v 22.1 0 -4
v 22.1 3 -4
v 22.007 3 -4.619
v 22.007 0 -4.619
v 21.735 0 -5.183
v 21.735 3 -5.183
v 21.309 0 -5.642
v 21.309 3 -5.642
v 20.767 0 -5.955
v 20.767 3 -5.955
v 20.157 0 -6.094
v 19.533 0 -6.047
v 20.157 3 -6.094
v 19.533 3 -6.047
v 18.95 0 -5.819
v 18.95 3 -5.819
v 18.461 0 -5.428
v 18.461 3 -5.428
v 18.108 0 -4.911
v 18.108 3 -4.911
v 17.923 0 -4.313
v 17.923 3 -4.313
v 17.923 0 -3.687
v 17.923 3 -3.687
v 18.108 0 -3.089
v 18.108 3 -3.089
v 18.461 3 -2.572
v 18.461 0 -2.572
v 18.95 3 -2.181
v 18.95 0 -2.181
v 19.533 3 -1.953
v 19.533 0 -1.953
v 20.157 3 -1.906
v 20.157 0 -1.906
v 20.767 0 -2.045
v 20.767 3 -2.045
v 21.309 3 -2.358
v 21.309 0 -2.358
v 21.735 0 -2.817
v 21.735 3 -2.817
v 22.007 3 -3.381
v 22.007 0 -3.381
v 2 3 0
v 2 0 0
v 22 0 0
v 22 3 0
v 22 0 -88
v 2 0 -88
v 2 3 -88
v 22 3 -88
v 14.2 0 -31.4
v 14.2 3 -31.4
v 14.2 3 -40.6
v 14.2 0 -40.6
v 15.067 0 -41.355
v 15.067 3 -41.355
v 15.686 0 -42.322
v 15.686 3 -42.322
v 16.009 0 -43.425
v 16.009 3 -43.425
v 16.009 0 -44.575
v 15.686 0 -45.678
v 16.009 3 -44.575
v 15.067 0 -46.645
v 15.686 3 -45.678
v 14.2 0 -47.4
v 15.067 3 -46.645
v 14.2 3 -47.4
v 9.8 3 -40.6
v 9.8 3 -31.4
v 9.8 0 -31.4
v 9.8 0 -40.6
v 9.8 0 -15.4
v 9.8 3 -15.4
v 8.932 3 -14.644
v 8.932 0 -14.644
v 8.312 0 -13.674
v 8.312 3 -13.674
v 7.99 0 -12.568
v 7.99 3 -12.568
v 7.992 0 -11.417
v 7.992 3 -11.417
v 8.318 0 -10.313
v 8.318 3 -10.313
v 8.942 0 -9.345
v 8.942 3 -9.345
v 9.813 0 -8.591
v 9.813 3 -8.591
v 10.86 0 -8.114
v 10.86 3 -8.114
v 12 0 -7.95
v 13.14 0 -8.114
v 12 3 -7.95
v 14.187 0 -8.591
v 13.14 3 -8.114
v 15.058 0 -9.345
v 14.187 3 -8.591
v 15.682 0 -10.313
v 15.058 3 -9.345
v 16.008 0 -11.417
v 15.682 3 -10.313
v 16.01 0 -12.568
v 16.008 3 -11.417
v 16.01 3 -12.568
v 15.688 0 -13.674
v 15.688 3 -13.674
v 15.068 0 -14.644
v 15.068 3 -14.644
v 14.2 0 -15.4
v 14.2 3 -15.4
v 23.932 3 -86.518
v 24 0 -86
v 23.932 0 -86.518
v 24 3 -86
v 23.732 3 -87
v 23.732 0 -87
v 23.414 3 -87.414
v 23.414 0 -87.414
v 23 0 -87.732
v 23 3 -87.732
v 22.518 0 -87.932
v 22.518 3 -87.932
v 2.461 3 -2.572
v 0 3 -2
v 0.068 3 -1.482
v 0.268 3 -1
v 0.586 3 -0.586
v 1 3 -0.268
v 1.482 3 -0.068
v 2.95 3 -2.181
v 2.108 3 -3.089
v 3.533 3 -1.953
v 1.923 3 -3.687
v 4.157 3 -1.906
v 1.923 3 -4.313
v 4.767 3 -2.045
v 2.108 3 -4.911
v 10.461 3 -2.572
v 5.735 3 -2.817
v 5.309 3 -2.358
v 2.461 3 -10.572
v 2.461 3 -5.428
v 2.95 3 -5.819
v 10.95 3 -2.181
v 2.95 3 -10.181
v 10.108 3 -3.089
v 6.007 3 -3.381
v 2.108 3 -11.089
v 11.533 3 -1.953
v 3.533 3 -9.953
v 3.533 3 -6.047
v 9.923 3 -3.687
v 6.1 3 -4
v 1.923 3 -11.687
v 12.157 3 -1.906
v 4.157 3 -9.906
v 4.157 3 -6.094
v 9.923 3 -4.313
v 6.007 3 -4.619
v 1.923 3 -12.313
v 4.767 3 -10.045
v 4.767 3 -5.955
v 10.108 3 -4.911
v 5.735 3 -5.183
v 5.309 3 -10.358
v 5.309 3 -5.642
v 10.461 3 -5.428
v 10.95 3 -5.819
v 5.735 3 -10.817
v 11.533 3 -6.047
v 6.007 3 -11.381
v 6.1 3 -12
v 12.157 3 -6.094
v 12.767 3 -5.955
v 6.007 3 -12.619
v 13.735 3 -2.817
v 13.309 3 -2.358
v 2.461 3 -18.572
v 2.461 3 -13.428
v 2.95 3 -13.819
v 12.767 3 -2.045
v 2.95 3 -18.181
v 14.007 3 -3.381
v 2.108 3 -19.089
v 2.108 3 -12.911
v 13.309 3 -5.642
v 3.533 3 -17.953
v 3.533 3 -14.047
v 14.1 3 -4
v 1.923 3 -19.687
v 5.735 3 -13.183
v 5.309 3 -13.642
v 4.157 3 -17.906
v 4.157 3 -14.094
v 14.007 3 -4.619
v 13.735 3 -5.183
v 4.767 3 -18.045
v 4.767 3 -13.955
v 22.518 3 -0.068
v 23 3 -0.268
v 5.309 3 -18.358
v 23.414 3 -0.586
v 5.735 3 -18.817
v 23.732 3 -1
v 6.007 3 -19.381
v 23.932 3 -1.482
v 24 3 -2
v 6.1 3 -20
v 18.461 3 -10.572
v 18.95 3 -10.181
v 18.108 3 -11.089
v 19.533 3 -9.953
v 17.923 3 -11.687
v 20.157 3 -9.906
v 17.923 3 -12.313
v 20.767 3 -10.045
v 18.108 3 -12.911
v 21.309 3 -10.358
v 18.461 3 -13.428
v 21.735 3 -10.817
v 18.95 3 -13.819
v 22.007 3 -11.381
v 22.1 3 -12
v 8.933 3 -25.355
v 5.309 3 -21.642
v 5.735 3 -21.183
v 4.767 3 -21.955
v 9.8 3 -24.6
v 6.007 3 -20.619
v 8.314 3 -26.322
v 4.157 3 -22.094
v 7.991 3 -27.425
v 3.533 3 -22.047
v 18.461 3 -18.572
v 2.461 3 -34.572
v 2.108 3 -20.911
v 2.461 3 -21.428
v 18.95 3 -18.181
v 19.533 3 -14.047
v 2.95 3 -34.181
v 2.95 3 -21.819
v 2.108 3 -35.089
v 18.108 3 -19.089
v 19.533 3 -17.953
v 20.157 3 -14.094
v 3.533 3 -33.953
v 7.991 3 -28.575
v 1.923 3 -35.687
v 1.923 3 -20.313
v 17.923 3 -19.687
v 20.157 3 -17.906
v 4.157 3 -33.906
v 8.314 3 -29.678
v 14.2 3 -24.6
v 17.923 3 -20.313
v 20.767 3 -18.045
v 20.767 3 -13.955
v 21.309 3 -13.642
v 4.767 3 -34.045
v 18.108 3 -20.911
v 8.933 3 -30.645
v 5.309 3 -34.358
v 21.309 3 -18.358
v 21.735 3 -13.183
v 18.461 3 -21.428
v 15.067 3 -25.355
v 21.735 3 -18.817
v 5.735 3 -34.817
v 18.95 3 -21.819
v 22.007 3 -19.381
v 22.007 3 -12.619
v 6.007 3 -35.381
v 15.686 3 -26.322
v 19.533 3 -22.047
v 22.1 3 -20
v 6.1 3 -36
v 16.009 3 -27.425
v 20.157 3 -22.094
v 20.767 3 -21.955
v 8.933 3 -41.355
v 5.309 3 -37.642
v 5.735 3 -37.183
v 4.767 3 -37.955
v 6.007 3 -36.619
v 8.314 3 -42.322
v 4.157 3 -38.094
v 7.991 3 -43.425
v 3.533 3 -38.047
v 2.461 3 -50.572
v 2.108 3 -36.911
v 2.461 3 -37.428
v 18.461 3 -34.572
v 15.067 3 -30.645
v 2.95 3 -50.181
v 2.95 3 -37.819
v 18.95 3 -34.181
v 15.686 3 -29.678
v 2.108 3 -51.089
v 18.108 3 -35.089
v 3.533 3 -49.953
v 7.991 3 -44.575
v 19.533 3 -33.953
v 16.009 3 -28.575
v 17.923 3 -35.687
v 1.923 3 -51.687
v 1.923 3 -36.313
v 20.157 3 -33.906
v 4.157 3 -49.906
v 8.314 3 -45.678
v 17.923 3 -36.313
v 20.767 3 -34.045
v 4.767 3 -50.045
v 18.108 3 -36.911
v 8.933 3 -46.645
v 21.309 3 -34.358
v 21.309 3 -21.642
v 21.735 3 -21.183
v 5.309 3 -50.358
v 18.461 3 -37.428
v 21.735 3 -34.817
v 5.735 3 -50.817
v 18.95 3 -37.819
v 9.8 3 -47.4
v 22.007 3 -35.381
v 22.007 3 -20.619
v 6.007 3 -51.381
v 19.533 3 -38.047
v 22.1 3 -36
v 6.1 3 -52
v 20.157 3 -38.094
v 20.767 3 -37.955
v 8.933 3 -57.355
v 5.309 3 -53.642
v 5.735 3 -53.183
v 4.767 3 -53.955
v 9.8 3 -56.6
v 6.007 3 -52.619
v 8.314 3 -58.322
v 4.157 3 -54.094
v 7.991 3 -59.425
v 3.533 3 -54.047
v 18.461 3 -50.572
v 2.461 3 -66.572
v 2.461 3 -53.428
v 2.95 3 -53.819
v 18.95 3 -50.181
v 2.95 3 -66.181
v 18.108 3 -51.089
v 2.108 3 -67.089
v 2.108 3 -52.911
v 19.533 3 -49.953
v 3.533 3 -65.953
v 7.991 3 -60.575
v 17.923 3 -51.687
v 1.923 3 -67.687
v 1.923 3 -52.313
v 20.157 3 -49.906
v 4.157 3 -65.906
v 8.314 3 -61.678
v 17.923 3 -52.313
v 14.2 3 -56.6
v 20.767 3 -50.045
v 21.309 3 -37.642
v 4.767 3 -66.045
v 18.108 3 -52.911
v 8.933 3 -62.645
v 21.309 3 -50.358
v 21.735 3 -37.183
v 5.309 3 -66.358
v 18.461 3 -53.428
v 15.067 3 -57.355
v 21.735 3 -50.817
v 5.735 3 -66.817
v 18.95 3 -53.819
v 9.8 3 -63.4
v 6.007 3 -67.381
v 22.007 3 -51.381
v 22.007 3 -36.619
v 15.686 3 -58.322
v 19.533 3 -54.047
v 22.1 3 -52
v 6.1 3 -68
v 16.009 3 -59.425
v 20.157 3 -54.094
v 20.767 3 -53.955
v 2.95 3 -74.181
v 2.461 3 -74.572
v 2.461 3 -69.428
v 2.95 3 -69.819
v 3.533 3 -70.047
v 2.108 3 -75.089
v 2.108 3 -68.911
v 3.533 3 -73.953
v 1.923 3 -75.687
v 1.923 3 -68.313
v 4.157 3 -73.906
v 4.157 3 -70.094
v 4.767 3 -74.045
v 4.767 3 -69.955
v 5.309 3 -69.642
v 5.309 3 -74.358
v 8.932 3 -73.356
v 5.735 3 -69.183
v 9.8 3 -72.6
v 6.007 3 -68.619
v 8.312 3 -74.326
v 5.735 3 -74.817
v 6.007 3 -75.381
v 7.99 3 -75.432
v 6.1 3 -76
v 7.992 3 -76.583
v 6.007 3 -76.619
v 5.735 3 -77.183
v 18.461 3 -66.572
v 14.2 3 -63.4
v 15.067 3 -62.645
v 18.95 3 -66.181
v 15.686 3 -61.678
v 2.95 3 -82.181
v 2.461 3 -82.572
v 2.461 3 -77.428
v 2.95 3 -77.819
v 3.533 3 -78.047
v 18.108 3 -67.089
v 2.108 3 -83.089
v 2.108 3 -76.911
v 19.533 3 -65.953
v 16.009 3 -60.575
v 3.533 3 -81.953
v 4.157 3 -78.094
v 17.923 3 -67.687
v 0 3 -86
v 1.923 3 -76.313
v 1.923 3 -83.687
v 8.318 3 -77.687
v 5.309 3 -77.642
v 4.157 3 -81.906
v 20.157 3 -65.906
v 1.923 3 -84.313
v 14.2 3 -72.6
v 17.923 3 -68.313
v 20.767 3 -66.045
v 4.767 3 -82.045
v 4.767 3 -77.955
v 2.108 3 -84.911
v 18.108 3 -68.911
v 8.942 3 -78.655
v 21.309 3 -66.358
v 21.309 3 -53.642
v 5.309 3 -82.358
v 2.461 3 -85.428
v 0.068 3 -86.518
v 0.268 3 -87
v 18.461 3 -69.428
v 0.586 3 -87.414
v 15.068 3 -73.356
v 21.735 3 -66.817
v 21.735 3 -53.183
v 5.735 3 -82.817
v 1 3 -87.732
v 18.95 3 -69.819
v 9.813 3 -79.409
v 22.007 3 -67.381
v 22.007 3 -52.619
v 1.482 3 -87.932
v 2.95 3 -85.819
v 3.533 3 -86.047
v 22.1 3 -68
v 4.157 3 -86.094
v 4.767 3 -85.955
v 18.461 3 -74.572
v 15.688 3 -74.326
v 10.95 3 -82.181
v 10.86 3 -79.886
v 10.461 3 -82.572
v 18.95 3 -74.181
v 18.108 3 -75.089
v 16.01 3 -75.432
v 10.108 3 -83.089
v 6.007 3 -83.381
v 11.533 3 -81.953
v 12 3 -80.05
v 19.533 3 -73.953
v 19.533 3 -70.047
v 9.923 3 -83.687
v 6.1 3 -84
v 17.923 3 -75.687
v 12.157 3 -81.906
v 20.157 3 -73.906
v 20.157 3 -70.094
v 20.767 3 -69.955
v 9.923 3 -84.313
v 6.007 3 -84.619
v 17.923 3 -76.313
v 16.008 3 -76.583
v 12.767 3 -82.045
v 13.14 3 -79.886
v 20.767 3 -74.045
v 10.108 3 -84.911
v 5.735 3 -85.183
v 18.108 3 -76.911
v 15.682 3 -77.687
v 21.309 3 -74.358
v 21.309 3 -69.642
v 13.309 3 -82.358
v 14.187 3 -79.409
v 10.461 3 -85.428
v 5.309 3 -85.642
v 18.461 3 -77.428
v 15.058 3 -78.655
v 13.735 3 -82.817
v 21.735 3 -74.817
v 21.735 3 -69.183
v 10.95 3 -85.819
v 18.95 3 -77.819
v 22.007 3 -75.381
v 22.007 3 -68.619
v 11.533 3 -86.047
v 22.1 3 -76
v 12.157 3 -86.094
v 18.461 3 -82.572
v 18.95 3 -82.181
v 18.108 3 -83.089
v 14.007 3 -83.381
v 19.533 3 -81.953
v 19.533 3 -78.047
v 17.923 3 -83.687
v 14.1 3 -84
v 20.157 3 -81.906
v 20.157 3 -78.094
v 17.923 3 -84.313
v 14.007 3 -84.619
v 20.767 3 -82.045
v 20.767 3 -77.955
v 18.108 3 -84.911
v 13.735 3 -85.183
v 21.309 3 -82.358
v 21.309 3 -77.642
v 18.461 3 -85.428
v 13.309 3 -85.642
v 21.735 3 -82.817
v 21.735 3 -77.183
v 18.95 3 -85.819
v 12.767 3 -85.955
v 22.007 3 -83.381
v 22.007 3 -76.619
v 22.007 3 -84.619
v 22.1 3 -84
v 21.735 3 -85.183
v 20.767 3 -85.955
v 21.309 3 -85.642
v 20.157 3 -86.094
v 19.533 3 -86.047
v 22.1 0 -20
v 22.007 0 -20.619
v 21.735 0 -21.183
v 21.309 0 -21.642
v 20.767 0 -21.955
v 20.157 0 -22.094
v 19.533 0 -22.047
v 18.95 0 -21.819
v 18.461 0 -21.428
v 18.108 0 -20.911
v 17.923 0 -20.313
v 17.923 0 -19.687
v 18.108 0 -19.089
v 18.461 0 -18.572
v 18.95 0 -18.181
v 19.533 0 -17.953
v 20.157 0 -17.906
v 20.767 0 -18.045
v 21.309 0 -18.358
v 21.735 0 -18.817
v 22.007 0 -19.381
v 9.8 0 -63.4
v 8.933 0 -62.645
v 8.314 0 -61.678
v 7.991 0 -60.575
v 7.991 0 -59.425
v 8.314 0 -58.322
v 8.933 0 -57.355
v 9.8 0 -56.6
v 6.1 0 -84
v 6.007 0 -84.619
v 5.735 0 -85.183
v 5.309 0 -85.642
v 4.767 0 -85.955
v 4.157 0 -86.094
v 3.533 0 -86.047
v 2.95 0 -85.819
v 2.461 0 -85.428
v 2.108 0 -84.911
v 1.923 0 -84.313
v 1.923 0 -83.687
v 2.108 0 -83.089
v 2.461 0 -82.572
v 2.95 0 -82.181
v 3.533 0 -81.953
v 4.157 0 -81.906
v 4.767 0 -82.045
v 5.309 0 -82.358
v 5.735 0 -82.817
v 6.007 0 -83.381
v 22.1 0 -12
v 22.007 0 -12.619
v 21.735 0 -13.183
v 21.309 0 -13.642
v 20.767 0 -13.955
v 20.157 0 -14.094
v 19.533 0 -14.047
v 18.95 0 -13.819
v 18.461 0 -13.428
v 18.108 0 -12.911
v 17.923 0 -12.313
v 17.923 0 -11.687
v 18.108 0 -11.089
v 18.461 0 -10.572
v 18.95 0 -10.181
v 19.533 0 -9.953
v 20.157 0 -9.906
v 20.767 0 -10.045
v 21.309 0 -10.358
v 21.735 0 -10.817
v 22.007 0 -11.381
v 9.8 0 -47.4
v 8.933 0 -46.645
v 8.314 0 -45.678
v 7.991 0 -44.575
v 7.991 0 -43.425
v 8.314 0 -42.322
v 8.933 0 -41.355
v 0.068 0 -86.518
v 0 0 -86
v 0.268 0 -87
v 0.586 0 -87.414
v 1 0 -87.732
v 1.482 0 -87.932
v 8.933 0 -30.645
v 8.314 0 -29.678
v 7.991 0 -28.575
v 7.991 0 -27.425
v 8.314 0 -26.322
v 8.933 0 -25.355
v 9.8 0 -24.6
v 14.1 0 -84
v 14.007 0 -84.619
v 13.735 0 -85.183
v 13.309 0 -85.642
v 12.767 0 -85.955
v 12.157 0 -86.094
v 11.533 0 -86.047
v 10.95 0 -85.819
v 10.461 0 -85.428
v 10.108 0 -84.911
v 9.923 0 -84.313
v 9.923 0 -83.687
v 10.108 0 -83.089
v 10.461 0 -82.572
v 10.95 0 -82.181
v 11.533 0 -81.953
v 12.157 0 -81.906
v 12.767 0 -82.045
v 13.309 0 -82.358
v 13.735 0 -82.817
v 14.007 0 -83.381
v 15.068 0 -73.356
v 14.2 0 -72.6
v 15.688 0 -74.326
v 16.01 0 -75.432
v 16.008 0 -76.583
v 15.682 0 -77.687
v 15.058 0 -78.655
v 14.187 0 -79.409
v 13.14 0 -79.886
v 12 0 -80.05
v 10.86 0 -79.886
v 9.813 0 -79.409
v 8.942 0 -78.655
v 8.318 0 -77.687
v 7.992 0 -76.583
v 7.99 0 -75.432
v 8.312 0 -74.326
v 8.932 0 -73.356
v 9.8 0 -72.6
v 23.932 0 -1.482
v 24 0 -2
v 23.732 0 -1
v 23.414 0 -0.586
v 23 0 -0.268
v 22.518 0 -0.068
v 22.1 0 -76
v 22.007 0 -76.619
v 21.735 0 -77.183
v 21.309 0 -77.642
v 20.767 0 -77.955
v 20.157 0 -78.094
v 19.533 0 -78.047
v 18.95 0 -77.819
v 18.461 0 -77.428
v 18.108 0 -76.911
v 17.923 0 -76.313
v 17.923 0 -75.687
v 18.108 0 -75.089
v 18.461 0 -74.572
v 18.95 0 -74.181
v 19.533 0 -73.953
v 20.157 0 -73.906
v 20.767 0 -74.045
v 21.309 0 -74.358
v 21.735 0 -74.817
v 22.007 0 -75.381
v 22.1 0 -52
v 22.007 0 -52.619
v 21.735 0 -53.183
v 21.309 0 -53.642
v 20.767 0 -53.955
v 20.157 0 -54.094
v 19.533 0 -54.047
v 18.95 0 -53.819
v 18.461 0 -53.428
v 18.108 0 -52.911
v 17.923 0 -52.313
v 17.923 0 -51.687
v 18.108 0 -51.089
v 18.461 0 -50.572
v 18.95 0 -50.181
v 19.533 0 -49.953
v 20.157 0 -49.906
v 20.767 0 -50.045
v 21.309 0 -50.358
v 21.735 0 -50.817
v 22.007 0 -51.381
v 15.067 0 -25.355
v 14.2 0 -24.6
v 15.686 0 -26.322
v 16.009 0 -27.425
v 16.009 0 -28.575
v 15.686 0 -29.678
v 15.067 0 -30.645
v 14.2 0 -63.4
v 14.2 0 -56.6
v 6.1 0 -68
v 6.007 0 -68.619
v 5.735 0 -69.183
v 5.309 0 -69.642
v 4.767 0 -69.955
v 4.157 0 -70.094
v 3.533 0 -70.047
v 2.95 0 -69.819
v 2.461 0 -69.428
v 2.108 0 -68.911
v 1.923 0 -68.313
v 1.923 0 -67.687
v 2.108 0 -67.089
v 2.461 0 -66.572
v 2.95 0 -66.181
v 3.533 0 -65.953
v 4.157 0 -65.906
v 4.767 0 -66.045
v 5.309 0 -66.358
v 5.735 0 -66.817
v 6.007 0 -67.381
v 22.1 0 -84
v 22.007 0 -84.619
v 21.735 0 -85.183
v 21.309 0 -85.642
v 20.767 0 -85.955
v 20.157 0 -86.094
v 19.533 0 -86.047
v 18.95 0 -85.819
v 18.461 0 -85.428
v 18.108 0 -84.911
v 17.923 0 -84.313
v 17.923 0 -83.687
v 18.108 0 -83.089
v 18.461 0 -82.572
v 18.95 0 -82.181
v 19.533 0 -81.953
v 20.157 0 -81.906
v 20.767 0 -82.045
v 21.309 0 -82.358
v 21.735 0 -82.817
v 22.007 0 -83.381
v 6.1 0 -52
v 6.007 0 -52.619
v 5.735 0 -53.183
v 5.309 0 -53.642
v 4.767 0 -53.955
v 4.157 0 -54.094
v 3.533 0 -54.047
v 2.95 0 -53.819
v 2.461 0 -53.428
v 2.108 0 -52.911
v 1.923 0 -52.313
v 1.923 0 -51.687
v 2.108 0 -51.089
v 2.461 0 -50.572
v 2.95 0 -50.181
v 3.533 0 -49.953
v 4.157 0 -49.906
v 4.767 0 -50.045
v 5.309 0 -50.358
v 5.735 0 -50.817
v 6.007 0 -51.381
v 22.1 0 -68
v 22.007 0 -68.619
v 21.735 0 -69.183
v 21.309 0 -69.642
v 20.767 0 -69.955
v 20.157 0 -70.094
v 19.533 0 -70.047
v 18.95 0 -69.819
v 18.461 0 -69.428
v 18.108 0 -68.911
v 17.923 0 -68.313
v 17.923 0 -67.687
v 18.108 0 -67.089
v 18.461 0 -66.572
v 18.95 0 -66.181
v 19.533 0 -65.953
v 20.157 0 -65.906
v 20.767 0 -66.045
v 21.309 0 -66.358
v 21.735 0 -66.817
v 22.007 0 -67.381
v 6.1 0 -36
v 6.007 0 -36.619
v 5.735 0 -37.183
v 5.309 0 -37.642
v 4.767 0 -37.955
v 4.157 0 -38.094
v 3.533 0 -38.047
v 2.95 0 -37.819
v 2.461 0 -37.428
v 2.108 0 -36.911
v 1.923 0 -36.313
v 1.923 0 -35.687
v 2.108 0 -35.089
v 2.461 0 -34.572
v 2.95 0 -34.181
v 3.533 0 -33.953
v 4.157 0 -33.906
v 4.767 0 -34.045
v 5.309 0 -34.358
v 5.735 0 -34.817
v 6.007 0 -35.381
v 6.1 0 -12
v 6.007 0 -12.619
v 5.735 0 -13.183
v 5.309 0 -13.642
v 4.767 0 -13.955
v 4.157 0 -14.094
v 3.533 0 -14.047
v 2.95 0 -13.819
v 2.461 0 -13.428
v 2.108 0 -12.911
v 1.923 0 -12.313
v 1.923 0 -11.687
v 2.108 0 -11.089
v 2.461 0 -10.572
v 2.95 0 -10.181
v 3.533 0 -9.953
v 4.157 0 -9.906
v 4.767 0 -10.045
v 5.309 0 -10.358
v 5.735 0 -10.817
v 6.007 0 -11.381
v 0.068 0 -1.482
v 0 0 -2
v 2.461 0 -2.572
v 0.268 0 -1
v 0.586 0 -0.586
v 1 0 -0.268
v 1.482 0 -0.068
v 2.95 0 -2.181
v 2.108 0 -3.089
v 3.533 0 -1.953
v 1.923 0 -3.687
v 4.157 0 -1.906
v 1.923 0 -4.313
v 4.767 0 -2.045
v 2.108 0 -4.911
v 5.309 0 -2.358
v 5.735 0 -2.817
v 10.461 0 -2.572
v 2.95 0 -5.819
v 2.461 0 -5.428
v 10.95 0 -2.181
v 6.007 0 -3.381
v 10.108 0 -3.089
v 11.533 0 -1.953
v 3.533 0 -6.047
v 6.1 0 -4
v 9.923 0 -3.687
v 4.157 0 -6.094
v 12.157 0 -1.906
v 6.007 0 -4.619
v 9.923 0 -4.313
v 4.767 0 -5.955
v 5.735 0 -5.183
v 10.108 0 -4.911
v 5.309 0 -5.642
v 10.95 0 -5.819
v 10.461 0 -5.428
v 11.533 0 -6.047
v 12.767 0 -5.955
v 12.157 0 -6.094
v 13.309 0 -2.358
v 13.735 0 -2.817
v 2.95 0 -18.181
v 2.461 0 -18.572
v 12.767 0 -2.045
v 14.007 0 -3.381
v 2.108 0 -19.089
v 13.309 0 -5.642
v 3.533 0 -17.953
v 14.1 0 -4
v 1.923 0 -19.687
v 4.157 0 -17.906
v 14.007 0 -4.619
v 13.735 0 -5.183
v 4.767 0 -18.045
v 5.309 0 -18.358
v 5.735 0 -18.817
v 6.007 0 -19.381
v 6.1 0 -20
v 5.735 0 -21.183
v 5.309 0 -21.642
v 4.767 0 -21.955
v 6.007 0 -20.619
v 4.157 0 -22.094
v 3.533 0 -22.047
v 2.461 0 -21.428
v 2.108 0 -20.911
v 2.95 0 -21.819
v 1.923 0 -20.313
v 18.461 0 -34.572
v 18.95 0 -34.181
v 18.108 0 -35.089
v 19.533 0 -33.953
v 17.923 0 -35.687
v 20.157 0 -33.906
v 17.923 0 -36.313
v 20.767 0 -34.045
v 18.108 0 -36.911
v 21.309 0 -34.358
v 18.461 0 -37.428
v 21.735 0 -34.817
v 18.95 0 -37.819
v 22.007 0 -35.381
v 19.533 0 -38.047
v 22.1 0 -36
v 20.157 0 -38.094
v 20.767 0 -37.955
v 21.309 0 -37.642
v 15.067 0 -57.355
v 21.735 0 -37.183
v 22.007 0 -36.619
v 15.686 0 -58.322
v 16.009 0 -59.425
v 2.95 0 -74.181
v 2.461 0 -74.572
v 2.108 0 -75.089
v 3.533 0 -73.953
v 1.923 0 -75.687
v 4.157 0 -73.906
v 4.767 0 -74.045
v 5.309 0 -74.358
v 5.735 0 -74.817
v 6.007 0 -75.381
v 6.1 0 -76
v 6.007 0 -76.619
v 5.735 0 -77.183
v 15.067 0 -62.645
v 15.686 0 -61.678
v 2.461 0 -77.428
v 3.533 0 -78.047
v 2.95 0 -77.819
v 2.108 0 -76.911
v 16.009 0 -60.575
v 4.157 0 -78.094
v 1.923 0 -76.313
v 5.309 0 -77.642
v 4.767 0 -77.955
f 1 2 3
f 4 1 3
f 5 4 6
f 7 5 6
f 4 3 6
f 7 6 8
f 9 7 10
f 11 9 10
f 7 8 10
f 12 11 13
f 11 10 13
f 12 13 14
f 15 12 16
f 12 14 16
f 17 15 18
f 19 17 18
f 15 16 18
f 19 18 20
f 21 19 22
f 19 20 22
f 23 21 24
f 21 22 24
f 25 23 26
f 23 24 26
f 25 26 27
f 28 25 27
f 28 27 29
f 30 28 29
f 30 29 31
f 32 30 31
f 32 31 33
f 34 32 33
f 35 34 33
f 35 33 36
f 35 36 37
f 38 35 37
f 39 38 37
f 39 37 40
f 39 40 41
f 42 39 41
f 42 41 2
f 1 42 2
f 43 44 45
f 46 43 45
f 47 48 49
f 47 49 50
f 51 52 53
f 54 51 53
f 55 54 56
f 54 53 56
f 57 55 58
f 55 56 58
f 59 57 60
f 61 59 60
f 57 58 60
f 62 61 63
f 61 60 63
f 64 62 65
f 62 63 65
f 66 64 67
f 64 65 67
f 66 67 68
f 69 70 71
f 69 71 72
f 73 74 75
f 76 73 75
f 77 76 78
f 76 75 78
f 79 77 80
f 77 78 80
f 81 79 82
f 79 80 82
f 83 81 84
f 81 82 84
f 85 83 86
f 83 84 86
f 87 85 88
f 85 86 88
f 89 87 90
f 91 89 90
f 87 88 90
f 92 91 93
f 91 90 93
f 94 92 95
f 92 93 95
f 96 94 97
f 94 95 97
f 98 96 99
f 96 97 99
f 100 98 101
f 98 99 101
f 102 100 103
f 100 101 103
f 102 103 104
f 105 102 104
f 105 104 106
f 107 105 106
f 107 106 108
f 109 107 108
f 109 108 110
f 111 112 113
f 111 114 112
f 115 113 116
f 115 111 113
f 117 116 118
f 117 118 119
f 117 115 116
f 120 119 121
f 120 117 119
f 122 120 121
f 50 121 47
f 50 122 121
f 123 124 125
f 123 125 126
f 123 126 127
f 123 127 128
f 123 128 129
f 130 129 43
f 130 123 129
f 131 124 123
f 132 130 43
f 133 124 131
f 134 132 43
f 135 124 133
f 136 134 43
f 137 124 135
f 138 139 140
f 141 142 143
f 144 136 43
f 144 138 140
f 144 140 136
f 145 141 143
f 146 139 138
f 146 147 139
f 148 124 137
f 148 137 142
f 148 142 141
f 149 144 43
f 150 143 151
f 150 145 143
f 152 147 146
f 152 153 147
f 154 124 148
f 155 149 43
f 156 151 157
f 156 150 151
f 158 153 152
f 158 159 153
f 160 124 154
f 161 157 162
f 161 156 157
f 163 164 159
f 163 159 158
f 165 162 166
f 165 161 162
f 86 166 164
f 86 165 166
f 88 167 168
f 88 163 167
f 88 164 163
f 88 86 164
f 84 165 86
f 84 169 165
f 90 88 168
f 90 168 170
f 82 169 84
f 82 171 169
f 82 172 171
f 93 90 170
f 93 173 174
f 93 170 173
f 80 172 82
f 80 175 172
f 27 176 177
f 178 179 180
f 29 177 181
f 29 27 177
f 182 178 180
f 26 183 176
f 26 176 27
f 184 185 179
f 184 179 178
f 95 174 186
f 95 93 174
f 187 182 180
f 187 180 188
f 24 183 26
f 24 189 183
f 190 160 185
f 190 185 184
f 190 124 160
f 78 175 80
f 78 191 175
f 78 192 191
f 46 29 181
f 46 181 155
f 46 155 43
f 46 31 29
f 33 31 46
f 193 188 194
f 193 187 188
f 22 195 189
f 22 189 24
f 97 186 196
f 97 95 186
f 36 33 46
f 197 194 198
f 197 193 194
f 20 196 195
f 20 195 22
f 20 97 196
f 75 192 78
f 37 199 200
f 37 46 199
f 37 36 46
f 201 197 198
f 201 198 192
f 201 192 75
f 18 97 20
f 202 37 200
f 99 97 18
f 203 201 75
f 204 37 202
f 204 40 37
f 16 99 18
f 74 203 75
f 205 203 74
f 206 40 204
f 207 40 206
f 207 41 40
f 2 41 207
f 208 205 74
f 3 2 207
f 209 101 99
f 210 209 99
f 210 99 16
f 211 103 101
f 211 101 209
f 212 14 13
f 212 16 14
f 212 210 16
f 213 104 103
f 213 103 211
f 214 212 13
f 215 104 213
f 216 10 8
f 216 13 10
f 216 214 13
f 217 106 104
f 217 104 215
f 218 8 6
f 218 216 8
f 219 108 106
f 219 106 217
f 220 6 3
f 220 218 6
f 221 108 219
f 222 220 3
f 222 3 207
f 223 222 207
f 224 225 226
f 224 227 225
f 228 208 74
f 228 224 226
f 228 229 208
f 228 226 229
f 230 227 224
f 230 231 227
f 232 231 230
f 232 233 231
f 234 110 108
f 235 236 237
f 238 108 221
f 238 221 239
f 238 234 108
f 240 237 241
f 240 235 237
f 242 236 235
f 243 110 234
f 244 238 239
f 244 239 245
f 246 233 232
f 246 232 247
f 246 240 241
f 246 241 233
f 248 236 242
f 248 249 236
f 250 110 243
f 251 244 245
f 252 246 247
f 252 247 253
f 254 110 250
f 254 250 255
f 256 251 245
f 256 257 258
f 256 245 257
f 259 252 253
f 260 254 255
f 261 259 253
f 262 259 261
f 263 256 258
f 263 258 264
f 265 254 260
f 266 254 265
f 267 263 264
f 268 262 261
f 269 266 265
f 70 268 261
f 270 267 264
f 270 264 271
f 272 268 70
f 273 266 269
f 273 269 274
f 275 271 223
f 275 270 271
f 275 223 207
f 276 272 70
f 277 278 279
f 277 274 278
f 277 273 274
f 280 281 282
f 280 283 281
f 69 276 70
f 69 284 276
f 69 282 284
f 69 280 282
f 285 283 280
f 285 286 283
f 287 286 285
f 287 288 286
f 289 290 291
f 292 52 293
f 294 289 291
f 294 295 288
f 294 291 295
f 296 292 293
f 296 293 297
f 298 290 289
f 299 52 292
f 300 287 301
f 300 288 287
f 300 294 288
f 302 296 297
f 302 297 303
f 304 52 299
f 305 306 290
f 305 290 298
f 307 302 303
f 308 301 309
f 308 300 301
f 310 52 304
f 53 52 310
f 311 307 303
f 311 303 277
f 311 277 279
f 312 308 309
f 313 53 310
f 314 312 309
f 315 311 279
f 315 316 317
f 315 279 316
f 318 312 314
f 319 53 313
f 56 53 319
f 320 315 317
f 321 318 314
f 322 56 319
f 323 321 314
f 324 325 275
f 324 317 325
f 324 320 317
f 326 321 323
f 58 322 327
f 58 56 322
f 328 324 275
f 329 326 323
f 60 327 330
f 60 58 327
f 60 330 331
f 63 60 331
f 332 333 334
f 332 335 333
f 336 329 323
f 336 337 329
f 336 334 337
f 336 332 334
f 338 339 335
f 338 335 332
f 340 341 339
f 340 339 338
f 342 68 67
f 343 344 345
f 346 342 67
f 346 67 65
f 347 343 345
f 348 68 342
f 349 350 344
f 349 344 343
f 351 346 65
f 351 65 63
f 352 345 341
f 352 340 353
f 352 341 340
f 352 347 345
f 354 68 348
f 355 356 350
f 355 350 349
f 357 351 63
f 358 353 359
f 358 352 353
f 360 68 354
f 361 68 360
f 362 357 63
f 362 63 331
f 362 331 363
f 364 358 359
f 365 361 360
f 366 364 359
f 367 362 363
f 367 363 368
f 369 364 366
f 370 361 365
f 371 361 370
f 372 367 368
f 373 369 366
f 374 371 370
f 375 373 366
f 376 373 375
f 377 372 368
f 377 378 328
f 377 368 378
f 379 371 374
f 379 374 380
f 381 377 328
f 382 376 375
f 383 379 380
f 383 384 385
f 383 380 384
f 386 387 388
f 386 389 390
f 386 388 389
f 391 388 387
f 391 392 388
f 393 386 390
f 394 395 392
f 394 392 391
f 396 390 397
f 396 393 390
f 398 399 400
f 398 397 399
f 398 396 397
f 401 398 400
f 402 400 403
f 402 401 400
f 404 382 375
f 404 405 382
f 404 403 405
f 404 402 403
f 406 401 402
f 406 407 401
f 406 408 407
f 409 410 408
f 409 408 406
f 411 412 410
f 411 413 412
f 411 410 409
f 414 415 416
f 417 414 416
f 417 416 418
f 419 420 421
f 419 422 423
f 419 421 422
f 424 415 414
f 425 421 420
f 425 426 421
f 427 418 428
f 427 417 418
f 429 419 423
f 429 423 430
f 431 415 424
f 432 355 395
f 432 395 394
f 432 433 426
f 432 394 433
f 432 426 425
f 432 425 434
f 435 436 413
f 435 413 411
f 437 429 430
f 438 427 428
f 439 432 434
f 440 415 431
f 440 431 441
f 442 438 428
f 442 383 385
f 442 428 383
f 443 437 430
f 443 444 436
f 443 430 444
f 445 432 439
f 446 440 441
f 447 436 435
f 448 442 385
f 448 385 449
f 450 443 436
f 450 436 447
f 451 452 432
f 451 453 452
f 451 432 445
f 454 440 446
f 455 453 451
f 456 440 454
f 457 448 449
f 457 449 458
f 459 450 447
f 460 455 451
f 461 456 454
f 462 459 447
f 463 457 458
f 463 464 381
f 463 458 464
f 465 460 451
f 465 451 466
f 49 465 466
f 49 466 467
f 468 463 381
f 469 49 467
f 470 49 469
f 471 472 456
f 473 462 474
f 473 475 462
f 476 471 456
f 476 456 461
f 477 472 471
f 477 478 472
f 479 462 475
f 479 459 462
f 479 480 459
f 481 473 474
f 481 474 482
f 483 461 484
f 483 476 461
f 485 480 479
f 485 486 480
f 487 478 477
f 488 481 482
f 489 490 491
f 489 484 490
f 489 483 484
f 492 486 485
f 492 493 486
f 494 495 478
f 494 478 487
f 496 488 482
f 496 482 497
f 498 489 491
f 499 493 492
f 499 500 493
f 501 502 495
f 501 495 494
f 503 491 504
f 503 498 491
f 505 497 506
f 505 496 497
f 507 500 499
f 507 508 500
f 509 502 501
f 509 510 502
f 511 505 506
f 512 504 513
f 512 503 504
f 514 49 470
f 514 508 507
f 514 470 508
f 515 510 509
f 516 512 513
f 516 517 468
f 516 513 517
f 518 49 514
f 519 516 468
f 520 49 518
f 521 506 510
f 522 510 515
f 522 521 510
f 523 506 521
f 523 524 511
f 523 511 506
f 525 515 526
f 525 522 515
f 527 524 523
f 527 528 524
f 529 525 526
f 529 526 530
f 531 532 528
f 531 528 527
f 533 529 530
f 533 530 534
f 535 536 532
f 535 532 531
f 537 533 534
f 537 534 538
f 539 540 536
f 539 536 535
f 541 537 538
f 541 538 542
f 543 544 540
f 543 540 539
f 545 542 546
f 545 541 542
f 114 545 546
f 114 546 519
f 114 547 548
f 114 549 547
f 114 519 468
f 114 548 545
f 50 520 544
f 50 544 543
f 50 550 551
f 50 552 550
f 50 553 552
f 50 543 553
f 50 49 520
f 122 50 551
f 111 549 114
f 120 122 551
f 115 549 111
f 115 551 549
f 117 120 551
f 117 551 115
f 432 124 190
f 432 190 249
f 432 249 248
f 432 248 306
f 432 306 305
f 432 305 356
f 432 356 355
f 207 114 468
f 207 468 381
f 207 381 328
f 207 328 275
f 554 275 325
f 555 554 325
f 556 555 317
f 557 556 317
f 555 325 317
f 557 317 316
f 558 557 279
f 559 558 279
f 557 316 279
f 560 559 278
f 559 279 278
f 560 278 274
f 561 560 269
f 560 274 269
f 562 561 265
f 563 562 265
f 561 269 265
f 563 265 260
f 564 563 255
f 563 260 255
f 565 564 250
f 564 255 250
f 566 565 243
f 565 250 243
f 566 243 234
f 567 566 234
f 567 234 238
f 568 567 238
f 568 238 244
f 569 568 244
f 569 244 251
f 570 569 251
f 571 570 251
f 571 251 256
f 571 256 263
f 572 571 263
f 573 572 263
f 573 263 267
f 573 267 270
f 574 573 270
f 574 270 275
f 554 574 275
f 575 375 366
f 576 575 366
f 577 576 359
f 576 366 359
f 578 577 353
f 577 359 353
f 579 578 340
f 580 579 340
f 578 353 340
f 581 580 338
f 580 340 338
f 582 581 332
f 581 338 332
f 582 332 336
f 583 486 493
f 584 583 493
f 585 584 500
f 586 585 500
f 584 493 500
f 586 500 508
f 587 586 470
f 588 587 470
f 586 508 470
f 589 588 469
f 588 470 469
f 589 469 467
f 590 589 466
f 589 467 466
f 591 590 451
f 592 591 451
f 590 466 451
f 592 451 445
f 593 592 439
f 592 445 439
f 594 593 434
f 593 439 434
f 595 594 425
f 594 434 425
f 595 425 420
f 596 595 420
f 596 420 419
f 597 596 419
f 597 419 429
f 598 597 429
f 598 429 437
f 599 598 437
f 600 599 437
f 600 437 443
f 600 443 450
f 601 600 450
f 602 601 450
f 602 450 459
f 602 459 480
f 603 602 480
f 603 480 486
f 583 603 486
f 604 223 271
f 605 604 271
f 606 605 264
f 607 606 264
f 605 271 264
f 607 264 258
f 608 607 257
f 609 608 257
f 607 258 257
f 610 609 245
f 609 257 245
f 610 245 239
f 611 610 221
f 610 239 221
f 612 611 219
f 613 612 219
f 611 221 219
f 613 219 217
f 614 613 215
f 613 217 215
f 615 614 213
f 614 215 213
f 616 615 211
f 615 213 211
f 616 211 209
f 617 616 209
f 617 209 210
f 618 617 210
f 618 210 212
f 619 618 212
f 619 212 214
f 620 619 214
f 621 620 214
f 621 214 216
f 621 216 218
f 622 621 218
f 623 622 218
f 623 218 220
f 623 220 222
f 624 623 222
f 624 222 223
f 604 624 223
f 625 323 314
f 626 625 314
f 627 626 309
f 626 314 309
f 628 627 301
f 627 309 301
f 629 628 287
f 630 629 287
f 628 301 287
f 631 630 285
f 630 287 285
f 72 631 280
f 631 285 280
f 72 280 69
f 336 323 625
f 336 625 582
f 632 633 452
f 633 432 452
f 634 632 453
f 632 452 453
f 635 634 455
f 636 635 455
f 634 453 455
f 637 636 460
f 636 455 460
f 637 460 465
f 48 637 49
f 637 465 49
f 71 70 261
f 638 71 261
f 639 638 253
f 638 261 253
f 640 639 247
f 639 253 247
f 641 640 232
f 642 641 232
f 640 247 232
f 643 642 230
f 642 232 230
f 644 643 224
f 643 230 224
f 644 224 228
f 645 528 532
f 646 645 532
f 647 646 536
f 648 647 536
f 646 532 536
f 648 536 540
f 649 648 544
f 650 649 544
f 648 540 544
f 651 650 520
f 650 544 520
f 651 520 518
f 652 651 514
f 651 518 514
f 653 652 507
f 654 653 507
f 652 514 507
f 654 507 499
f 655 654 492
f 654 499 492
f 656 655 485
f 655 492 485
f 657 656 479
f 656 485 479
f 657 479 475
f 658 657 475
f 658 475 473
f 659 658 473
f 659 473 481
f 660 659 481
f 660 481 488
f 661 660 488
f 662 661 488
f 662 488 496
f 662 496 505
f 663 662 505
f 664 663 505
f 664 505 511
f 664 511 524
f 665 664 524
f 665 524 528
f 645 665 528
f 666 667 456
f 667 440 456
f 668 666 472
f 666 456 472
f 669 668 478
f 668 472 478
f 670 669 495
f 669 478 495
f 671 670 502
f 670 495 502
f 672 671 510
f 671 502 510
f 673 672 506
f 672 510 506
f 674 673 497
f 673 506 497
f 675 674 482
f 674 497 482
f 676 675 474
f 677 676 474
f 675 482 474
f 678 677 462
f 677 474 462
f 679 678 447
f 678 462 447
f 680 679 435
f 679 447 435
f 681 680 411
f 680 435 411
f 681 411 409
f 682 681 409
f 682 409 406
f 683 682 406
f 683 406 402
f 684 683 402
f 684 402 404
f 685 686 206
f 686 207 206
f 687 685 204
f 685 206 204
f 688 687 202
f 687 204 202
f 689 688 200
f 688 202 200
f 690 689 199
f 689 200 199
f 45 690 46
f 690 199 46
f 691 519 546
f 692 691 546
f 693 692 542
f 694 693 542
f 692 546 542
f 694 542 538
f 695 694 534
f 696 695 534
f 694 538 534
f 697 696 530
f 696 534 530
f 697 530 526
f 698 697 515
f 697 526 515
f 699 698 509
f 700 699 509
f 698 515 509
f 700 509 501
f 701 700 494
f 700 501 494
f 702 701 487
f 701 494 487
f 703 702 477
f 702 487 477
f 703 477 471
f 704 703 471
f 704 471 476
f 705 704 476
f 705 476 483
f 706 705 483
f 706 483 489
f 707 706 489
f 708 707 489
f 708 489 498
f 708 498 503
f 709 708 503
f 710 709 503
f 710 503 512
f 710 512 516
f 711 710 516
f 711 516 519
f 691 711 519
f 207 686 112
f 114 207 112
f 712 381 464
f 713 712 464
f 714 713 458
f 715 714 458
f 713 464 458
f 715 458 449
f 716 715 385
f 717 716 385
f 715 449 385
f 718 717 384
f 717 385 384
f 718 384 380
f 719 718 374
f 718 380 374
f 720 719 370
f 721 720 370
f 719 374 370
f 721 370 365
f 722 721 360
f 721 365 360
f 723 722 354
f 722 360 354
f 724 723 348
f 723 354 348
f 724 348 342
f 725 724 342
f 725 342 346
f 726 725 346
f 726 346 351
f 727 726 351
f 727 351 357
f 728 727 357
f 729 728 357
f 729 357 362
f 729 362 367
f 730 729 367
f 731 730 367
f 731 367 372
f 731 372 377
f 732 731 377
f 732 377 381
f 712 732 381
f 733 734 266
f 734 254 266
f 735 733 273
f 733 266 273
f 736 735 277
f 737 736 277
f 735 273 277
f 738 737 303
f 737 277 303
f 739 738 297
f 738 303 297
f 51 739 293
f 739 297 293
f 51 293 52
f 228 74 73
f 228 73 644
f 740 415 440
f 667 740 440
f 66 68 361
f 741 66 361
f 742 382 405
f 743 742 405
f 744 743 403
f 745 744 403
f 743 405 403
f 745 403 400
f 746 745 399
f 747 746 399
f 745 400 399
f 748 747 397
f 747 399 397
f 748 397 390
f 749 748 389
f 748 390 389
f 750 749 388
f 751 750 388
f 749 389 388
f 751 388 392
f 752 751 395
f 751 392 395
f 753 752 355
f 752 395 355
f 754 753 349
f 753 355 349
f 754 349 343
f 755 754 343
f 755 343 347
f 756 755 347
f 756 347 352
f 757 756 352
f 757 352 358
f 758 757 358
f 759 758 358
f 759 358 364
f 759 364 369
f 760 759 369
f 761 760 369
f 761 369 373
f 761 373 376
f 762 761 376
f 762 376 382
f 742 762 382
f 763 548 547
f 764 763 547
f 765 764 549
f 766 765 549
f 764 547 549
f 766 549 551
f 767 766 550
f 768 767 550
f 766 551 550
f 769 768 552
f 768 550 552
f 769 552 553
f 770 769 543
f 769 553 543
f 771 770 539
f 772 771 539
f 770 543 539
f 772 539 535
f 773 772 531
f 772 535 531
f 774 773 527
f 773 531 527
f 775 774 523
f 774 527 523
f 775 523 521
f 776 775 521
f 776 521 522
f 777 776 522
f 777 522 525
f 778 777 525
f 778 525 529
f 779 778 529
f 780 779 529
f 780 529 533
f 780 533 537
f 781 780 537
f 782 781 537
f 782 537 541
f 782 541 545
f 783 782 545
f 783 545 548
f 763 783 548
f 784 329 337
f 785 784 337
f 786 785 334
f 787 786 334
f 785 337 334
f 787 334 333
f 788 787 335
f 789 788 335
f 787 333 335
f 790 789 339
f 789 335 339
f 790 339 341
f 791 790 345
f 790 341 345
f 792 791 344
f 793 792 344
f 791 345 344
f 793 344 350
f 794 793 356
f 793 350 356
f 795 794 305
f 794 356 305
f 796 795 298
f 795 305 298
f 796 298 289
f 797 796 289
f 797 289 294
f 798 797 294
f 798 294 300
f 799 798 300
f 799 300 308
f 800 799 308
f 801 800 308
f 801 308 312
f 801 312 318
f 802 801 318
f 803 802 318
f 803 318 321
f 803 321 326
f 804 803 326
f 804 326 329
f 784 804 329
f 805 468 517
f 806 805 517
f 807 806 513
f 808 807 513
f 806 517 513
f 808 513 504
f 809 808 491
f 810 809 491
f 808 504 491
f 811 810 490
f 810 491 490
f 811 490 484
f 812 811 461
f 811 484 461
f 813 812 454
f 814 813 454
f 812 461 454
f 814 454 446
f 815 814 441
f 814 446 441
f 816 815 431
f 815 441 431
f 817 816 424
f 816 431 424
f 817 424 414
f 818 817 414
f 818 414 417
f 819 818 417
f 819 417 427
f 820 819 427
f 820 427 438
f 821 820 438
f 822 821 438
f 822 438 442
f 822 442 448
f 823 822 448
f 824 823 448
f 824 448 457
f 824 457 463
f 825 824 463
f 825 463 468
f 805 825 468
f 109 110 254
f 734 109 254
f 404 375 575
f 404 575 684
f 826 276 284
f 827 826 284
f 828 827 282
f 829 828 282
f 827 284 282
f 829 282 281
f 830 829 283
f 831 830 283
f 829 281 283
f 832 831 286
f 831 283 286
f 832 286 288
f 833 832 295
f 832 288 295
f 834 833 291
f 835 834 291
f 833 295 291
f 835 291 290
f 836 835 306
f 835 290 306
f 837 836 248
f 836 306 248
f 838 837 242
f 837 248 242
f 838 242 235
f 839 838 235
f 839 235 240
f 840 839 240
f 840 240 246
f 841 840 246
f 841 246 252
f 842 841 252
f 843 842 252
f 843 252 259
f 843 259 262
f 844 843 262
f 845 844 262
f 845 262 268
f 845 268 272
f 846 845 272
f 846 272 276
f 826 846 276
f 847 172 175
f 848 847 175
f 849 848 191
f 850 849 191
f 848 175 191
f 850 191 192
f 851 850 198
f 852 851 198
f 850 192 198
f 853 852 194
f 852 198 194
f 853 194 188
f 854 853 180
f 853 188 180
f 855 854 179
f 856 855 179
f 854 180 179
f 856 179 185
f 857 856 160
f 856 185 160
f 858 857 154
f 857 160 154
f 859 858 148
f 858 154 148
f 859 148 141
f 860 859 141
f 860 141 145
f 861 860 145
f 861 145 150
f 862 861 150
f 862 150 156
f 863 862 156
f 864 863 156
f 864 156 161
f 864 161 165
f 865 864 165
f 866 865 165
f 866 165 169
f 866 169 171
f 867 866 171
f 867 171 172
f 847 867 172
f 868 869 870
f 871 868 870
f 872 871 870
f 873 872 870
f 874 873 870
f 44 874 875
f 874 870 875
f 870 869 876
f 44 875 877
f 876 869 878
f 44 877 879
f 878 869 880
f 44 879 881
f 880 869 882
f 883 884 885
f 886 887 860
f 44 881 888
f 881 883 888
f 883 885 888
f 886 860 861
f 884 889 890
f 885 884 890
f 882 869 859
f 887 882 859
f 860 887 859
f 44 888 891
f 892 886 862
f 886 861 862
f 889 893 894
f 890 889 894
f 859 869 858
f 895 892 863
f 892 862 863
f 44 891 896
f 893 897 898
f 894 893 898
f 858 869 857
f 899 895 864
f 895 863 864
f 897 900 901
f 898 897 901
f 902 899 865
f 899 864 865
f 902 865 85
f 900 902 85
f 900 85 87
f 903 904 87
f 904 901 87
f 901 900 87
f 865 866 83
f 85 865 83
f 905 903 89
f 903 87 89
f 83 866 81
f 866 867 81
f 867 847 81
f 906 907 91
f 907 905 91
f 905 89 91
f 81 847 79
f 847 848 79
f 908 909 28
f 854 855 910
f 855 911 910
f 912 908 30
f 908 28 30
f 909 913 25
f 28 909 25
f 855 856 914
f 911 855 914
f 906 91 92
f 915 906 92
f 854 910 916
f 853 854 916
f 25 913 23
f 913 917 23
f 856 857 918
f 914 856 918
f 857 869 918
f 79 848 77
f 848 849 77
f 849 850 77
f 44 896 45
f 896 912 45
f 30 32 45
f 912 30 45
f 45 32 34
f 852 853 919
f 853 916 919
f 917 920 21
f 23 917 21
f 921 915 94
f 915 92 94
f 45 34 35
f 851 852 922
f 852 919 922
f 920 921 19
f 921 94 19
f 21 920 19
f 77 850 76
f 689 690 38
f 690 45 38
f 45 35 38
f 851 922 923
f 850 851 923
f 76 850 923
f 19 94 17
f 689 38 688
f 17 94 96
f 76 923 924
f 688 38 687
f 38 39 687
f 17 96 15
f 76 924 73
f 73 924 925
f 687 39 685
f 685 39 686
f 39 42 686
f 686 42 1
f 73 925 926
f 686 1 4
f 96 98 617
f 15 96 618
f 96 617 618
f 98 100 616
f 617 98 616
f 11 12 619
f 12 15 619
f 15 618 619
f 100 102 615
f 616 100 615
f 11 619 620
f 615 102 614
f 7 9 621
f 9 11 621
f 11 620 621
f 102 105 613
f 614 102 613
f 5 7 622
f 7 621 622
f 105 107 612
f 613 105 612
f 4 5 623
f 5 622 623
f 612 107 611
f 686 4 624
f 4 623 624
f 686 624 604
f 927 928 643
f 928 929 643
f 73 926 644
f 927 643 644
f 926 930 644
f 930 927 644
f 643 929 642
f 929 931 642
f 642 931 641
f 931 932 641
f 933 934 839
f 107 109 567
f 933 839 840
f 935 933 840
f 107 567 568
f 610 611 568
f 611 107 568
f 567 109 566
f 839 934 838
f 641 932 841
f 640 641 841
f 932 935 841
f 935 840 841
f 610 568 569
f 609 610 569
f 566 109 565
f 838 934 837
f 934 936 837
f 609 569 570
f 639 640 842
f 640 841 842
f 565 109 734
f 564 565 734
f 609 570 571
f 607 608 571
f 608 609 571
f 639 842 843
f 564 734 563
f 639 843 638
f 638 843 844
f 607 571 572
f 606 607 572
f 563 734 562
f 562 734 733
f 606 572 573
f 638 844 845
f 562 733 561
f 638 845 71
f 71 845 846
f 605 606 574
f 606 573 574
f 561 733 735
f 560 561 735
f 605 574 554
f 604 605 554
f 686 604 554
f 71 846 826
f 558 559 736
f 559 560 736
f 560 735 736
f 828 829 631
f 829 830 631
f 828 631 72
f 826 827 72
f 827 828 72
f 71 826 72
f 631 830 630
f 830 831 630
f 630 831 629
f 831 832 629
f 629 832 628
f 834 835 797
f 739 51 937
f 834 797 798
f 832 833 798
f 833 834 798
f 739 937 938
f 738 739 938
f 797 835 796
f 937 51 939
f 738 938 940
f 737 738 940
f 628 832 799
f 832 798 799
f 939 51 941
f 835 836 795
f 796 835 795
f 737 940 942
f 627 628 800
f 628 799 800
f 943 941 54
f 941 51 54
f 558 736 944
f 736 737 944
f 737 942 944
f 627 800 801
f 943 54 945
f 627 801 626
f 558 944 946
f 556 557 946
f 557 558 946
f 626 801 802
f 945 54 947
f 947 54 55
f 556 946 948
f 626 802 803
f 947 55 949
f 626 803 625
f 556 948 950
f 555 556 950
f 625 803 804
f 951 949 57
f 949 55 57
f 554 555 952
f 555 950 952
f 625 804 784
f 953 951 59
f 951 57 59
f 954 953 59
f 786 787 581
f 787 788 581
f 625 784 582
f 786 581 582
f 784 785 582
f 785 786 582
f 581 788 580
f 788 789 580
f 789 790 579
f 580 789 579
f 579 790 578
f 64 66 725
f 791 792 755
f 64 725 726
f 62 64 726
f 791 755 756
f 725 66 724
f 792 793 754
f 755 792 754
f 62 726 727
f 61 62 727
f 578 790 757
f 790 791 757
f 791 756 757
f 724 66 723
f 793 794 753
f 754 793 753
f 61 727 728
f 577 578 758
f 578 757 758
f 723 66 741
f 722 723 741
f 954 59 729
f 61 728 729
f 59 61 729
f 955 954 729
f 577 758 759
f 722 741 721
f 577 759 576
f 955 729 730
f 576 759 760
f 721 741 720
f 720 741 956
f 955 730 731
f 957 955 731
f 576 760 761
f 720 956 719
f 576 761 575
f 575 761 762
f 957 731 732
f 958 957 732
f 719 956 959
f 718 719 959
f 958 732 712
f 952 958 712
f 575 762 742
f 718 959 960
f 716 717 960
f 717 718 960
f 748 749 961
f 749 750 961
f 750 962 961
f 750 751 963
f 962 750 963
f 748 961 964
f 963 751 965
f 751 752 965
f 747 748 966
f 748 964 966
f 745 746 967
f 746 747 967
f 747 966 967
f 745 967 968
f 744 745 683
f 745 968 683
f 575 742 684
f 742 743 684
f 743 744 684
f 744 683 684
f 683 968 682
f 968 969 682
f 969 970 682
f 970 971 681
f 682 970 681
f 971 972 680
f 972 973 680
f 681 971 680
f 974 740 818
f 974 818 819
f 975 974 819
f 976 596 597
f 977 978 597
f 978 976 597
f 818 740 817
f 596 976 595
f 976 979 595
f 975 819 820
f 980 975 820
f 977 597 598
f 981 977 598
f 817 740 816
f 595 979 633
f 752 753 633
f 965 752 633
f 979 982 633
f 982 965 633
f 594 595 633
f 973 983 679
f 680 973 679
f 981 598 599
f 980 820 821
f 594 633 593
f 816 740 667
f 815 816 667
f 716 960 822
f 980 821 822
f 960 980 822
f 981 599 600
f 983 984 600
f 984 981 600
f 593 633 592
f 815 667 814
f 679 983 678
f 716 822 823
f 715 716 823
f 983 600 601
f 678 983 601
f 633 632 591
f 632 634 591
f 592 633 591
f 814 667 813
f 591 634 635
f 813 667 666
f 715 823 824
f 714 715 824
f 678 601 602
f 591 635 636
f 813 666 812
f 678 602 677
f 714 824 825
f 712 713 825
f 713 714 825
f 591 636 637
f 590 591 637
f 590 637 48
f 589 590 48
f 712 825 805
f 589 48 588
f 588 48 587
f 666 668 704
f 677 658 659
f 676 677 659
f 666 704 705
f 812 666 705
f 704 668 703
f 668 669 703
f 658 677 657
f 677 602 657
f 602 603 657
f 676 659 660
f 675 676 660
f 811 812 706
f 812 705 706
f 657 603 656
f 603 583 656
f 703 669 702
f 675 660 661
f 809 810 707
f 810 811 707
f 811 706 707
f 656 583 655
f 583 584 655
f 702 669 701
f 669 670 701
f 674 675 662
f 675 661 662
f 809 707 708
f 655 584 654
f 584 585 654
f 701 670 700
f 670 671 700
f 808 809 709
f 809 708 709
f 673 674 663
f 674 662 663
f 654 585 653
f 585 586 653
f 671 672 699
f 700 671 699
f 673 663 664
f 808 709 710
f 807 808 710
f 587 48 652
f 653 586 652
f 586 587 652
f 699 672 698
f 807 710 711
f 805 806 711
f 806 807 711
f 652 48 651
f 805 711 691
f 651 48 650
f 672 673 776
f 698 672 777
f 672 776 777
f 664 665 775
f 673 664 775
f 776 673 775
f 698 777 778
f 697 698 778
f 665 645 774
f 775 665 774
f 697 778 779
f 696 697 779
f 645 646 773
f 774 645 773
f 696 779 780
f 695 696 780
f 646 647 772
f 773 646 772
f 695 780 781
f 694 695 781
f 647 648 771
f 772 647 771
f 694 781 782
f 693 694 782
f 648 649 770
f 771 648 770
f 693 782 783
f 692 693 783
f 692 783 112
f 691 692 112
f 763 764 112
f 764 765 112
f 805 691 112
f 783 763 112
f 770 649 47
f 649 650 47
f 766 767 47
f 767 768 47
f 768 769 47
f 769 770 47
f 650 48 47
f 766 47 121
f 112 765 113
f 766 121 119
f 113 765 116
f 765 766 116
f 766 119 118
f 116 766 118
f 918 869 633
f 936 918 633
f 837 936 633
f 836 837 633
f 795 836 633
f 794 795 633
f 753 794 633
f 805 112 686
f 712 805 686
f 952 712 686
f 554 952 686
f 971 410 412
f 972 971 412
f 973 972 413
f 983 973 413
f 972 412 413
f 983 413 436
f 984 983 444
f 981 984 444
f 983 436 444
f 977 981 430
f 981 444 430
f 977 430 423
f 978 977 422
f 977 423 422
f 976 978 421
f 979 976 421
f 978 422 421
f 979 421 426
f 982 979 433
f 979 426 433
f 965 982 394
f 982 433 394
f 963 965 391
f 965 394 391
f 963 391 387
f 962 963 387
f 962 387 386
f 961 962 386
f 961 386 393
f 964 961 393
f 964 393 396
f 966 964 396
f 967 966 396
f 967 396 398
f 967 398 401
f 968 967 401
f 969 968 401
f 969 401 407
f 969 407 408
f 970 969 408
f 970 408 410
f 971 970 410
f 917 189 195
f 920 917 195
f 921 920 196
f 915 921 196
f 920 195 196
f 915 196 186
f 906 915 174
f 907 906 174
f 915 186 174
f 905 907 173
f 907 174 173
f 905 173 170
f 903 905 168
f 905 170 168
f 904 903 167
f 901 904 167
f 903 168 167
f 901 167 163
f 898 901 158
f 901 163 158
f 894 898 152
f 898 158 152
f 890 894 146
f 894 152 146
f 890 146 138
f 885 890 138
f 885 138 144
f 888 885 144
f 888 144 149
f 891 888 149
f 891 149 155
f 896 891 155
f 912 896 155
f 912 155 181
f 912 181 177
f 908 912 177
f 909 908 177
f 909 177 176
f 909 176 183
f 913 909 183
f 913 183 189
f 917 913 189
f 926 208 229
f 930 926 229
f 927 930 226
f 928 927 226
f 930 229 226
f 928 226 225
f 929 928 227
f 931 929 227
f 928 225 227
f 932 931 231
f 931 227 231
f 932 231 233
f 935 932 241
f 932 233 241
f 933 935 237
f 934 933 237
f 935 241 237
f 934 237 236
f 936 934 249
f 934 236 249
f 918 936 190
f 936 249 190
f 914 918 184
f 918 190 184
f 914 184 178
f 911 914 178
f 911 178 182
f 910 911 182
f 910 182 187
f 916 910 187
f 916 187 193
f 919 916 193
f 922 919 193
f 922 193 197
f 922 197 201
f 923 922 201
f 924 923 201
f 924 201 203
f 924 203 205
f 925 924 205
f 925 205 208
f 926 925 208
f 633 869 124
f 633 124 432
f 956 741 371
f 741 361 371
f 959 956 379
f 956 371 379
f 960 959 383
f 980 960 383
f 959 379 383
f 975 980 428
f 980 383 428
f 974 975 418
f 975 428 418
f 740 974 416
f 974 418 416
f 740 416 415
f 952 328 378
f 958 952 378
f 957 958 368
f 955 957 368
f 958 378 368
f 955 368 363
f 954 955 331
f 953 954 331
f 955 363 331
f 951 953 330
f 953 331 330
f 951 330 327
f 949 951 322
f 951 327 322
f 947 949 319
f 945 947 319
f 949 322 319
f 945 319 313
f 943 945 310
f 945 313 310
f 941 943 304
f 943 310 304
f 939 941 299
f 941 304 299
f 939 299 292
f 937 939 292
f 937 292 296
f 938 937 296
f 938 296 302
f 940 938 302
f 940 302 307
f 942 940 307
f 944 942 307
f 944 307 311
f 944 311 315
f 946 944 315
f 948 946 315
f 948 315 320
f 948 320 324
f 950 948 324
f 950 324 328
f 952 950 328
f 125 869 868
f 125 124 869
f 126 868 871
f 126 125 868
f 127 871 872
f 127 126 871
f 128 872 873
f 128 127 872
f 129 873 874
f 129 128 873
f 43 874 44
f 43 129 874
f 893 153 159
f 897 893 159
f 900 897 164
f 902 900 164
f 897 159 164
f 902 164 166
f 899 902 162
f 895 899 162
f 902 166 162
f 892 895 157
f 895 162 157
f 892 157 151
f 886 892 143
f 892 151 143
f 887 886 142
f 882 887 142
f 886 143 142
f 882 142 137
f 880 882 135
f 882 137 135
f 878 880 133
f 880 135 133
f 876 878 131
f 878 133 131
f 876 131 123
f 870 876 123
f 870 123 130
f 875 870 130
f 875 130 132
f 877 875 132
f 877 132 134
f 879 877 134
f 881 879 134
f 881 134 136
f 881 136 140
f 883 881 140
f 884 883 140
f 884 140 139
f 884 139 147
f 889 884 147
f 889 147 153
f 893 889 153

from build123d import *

# Parameters (mm, degrees)
SKETCH1_W           = 24
SKETCH1_H           = 88
BOSS_EXTRUDE1_DEPTH = 3
SKETCH2_R           = 2.1
CUT_EXTRUDE1_DEPTH  = 4
SKETCH3_R           = 4.05
CUT_EXTRUDE2_DEPTH  = 4
LPATTERN1_COUNT     = 5
LPATTERN1_PITCH     = 16
SKETCH4_W           = 4.4
SKETCH4_H           = 64
CUT_EXTRUDE3_DEPTH  = 4
FILLET1_R           = 2


with BuildPart() as part:
    # Sketch1 → Boss-Extrude1 (new body)
    with BuildSketch(Plane(origin=(0, 0, 0), x_dir=(1, 0, 0), z_dir=(0, 1, 0))):
        with Locations((12, 44)):
            Rectangle(SKETCH1_W, SKETCH1_H)
    extrude(amount=BOSS_EXTRUDE1_DEPTH)

    # Sketch2 → Cut-Extrude1 (cut, through all)
    with BuildSketch(Plane(origin=(0, 3, 0), x_dir=(1, 0, 0), z_dir=(0, 1, 0))):
        with Locations((12, 84)):
            Circle(SKETCH2_R)
        with Locations((4, 84)):
            Circle(SKETCH2_R)
        with Locations((4, 76)):
            Circle(SKETCH2_R)
        with Locations((4, 68)):
            Circle(SKETCH2_R)
        with Locations((4, 52)):
            Circle(SKETCH2_R)
        with Locations((20, 52)):
            Circle(SKETCH2_R)
        with Locations((20, 68)):
            Circle(SKETCH2_R)
        with Locations((20, 76)):
            Circle(SKETCH2_R)
        with Locations((20, 84)):
            Circle(SKETCH2_R)
        with Locations((20, 4)):
            Circle(SKETCH2_R)
        with Locations((20, 12)):
            Circle(SKETCH2_R)
        with Locations((20, 20)):
            Circle(SKETCH2_R)
        with Locations((20, 36)):
            Circle(SKETCH2_R)
        with Locations((4, 36)):
            Circle(SKETCH2_R)
        with Locations((4, 20)):
            Circle(SKETCH2_R)
        with Locations((4, 12)):
            Circle(SKETCH2_R)
        with Locations((4, 4)):
            Circle(SKETCH2_R)
        with Locations((12, 4)):
            Circle(SKETCH2_R)
    extrude(amount=-CUT_EXTRUDE1_DEPTH, mode=Mode.SUBTRACT)

    # Sketch3 → Cut-Extrude2 (cut, through all)
    with BuildSketch(Plane(origin=(0, 3, 0), x_dir=(1, 0, 0), z_dir=(0, 1, 0))):
        with Locations((12, 76)):
            Circle(SKETCH3_R)
    cut_extrude2 = extrude(amount=-CUT_EXTRUDE2_DEPTH, mode=Mode.SUBTRACT)

    # LPattern1: Cut-Extrude2 ×5
    with Locations(*[(0, 0, i * LPATTERN1_PITCH) for i in range(1, LPATTERN1_COUNT)]):
        add(cut_extrude2, mode=Mode.SUBTRACT)

    # Sketch4 → Cut-Extrude3 (cut, through all)
    with BuildSketch(Plane(origin=(0, 3, 0), x_dir=(1, 0, 0), z_dir=(0, 1, 0))):
        with Locations((12, 44)):
            Rectangle(SKETCH4_W, SKETCH4_H)
    extrude(amount=-CUT_EXTRUDE3_DEPTH, mode=Mode.SUBTRACT)

    # Fillet1
    fillet1_edges = [part.edges().sort_by_distance(p)[0] for p in [
        (0, 1.5, -88),
        (24, 1.5, -88),
        (24, 1.5, 0),
        (0, 1.5, 0),
    ]]
    fillet(fillet1_edges, radius=FILLET1_R)


solid = part.part
